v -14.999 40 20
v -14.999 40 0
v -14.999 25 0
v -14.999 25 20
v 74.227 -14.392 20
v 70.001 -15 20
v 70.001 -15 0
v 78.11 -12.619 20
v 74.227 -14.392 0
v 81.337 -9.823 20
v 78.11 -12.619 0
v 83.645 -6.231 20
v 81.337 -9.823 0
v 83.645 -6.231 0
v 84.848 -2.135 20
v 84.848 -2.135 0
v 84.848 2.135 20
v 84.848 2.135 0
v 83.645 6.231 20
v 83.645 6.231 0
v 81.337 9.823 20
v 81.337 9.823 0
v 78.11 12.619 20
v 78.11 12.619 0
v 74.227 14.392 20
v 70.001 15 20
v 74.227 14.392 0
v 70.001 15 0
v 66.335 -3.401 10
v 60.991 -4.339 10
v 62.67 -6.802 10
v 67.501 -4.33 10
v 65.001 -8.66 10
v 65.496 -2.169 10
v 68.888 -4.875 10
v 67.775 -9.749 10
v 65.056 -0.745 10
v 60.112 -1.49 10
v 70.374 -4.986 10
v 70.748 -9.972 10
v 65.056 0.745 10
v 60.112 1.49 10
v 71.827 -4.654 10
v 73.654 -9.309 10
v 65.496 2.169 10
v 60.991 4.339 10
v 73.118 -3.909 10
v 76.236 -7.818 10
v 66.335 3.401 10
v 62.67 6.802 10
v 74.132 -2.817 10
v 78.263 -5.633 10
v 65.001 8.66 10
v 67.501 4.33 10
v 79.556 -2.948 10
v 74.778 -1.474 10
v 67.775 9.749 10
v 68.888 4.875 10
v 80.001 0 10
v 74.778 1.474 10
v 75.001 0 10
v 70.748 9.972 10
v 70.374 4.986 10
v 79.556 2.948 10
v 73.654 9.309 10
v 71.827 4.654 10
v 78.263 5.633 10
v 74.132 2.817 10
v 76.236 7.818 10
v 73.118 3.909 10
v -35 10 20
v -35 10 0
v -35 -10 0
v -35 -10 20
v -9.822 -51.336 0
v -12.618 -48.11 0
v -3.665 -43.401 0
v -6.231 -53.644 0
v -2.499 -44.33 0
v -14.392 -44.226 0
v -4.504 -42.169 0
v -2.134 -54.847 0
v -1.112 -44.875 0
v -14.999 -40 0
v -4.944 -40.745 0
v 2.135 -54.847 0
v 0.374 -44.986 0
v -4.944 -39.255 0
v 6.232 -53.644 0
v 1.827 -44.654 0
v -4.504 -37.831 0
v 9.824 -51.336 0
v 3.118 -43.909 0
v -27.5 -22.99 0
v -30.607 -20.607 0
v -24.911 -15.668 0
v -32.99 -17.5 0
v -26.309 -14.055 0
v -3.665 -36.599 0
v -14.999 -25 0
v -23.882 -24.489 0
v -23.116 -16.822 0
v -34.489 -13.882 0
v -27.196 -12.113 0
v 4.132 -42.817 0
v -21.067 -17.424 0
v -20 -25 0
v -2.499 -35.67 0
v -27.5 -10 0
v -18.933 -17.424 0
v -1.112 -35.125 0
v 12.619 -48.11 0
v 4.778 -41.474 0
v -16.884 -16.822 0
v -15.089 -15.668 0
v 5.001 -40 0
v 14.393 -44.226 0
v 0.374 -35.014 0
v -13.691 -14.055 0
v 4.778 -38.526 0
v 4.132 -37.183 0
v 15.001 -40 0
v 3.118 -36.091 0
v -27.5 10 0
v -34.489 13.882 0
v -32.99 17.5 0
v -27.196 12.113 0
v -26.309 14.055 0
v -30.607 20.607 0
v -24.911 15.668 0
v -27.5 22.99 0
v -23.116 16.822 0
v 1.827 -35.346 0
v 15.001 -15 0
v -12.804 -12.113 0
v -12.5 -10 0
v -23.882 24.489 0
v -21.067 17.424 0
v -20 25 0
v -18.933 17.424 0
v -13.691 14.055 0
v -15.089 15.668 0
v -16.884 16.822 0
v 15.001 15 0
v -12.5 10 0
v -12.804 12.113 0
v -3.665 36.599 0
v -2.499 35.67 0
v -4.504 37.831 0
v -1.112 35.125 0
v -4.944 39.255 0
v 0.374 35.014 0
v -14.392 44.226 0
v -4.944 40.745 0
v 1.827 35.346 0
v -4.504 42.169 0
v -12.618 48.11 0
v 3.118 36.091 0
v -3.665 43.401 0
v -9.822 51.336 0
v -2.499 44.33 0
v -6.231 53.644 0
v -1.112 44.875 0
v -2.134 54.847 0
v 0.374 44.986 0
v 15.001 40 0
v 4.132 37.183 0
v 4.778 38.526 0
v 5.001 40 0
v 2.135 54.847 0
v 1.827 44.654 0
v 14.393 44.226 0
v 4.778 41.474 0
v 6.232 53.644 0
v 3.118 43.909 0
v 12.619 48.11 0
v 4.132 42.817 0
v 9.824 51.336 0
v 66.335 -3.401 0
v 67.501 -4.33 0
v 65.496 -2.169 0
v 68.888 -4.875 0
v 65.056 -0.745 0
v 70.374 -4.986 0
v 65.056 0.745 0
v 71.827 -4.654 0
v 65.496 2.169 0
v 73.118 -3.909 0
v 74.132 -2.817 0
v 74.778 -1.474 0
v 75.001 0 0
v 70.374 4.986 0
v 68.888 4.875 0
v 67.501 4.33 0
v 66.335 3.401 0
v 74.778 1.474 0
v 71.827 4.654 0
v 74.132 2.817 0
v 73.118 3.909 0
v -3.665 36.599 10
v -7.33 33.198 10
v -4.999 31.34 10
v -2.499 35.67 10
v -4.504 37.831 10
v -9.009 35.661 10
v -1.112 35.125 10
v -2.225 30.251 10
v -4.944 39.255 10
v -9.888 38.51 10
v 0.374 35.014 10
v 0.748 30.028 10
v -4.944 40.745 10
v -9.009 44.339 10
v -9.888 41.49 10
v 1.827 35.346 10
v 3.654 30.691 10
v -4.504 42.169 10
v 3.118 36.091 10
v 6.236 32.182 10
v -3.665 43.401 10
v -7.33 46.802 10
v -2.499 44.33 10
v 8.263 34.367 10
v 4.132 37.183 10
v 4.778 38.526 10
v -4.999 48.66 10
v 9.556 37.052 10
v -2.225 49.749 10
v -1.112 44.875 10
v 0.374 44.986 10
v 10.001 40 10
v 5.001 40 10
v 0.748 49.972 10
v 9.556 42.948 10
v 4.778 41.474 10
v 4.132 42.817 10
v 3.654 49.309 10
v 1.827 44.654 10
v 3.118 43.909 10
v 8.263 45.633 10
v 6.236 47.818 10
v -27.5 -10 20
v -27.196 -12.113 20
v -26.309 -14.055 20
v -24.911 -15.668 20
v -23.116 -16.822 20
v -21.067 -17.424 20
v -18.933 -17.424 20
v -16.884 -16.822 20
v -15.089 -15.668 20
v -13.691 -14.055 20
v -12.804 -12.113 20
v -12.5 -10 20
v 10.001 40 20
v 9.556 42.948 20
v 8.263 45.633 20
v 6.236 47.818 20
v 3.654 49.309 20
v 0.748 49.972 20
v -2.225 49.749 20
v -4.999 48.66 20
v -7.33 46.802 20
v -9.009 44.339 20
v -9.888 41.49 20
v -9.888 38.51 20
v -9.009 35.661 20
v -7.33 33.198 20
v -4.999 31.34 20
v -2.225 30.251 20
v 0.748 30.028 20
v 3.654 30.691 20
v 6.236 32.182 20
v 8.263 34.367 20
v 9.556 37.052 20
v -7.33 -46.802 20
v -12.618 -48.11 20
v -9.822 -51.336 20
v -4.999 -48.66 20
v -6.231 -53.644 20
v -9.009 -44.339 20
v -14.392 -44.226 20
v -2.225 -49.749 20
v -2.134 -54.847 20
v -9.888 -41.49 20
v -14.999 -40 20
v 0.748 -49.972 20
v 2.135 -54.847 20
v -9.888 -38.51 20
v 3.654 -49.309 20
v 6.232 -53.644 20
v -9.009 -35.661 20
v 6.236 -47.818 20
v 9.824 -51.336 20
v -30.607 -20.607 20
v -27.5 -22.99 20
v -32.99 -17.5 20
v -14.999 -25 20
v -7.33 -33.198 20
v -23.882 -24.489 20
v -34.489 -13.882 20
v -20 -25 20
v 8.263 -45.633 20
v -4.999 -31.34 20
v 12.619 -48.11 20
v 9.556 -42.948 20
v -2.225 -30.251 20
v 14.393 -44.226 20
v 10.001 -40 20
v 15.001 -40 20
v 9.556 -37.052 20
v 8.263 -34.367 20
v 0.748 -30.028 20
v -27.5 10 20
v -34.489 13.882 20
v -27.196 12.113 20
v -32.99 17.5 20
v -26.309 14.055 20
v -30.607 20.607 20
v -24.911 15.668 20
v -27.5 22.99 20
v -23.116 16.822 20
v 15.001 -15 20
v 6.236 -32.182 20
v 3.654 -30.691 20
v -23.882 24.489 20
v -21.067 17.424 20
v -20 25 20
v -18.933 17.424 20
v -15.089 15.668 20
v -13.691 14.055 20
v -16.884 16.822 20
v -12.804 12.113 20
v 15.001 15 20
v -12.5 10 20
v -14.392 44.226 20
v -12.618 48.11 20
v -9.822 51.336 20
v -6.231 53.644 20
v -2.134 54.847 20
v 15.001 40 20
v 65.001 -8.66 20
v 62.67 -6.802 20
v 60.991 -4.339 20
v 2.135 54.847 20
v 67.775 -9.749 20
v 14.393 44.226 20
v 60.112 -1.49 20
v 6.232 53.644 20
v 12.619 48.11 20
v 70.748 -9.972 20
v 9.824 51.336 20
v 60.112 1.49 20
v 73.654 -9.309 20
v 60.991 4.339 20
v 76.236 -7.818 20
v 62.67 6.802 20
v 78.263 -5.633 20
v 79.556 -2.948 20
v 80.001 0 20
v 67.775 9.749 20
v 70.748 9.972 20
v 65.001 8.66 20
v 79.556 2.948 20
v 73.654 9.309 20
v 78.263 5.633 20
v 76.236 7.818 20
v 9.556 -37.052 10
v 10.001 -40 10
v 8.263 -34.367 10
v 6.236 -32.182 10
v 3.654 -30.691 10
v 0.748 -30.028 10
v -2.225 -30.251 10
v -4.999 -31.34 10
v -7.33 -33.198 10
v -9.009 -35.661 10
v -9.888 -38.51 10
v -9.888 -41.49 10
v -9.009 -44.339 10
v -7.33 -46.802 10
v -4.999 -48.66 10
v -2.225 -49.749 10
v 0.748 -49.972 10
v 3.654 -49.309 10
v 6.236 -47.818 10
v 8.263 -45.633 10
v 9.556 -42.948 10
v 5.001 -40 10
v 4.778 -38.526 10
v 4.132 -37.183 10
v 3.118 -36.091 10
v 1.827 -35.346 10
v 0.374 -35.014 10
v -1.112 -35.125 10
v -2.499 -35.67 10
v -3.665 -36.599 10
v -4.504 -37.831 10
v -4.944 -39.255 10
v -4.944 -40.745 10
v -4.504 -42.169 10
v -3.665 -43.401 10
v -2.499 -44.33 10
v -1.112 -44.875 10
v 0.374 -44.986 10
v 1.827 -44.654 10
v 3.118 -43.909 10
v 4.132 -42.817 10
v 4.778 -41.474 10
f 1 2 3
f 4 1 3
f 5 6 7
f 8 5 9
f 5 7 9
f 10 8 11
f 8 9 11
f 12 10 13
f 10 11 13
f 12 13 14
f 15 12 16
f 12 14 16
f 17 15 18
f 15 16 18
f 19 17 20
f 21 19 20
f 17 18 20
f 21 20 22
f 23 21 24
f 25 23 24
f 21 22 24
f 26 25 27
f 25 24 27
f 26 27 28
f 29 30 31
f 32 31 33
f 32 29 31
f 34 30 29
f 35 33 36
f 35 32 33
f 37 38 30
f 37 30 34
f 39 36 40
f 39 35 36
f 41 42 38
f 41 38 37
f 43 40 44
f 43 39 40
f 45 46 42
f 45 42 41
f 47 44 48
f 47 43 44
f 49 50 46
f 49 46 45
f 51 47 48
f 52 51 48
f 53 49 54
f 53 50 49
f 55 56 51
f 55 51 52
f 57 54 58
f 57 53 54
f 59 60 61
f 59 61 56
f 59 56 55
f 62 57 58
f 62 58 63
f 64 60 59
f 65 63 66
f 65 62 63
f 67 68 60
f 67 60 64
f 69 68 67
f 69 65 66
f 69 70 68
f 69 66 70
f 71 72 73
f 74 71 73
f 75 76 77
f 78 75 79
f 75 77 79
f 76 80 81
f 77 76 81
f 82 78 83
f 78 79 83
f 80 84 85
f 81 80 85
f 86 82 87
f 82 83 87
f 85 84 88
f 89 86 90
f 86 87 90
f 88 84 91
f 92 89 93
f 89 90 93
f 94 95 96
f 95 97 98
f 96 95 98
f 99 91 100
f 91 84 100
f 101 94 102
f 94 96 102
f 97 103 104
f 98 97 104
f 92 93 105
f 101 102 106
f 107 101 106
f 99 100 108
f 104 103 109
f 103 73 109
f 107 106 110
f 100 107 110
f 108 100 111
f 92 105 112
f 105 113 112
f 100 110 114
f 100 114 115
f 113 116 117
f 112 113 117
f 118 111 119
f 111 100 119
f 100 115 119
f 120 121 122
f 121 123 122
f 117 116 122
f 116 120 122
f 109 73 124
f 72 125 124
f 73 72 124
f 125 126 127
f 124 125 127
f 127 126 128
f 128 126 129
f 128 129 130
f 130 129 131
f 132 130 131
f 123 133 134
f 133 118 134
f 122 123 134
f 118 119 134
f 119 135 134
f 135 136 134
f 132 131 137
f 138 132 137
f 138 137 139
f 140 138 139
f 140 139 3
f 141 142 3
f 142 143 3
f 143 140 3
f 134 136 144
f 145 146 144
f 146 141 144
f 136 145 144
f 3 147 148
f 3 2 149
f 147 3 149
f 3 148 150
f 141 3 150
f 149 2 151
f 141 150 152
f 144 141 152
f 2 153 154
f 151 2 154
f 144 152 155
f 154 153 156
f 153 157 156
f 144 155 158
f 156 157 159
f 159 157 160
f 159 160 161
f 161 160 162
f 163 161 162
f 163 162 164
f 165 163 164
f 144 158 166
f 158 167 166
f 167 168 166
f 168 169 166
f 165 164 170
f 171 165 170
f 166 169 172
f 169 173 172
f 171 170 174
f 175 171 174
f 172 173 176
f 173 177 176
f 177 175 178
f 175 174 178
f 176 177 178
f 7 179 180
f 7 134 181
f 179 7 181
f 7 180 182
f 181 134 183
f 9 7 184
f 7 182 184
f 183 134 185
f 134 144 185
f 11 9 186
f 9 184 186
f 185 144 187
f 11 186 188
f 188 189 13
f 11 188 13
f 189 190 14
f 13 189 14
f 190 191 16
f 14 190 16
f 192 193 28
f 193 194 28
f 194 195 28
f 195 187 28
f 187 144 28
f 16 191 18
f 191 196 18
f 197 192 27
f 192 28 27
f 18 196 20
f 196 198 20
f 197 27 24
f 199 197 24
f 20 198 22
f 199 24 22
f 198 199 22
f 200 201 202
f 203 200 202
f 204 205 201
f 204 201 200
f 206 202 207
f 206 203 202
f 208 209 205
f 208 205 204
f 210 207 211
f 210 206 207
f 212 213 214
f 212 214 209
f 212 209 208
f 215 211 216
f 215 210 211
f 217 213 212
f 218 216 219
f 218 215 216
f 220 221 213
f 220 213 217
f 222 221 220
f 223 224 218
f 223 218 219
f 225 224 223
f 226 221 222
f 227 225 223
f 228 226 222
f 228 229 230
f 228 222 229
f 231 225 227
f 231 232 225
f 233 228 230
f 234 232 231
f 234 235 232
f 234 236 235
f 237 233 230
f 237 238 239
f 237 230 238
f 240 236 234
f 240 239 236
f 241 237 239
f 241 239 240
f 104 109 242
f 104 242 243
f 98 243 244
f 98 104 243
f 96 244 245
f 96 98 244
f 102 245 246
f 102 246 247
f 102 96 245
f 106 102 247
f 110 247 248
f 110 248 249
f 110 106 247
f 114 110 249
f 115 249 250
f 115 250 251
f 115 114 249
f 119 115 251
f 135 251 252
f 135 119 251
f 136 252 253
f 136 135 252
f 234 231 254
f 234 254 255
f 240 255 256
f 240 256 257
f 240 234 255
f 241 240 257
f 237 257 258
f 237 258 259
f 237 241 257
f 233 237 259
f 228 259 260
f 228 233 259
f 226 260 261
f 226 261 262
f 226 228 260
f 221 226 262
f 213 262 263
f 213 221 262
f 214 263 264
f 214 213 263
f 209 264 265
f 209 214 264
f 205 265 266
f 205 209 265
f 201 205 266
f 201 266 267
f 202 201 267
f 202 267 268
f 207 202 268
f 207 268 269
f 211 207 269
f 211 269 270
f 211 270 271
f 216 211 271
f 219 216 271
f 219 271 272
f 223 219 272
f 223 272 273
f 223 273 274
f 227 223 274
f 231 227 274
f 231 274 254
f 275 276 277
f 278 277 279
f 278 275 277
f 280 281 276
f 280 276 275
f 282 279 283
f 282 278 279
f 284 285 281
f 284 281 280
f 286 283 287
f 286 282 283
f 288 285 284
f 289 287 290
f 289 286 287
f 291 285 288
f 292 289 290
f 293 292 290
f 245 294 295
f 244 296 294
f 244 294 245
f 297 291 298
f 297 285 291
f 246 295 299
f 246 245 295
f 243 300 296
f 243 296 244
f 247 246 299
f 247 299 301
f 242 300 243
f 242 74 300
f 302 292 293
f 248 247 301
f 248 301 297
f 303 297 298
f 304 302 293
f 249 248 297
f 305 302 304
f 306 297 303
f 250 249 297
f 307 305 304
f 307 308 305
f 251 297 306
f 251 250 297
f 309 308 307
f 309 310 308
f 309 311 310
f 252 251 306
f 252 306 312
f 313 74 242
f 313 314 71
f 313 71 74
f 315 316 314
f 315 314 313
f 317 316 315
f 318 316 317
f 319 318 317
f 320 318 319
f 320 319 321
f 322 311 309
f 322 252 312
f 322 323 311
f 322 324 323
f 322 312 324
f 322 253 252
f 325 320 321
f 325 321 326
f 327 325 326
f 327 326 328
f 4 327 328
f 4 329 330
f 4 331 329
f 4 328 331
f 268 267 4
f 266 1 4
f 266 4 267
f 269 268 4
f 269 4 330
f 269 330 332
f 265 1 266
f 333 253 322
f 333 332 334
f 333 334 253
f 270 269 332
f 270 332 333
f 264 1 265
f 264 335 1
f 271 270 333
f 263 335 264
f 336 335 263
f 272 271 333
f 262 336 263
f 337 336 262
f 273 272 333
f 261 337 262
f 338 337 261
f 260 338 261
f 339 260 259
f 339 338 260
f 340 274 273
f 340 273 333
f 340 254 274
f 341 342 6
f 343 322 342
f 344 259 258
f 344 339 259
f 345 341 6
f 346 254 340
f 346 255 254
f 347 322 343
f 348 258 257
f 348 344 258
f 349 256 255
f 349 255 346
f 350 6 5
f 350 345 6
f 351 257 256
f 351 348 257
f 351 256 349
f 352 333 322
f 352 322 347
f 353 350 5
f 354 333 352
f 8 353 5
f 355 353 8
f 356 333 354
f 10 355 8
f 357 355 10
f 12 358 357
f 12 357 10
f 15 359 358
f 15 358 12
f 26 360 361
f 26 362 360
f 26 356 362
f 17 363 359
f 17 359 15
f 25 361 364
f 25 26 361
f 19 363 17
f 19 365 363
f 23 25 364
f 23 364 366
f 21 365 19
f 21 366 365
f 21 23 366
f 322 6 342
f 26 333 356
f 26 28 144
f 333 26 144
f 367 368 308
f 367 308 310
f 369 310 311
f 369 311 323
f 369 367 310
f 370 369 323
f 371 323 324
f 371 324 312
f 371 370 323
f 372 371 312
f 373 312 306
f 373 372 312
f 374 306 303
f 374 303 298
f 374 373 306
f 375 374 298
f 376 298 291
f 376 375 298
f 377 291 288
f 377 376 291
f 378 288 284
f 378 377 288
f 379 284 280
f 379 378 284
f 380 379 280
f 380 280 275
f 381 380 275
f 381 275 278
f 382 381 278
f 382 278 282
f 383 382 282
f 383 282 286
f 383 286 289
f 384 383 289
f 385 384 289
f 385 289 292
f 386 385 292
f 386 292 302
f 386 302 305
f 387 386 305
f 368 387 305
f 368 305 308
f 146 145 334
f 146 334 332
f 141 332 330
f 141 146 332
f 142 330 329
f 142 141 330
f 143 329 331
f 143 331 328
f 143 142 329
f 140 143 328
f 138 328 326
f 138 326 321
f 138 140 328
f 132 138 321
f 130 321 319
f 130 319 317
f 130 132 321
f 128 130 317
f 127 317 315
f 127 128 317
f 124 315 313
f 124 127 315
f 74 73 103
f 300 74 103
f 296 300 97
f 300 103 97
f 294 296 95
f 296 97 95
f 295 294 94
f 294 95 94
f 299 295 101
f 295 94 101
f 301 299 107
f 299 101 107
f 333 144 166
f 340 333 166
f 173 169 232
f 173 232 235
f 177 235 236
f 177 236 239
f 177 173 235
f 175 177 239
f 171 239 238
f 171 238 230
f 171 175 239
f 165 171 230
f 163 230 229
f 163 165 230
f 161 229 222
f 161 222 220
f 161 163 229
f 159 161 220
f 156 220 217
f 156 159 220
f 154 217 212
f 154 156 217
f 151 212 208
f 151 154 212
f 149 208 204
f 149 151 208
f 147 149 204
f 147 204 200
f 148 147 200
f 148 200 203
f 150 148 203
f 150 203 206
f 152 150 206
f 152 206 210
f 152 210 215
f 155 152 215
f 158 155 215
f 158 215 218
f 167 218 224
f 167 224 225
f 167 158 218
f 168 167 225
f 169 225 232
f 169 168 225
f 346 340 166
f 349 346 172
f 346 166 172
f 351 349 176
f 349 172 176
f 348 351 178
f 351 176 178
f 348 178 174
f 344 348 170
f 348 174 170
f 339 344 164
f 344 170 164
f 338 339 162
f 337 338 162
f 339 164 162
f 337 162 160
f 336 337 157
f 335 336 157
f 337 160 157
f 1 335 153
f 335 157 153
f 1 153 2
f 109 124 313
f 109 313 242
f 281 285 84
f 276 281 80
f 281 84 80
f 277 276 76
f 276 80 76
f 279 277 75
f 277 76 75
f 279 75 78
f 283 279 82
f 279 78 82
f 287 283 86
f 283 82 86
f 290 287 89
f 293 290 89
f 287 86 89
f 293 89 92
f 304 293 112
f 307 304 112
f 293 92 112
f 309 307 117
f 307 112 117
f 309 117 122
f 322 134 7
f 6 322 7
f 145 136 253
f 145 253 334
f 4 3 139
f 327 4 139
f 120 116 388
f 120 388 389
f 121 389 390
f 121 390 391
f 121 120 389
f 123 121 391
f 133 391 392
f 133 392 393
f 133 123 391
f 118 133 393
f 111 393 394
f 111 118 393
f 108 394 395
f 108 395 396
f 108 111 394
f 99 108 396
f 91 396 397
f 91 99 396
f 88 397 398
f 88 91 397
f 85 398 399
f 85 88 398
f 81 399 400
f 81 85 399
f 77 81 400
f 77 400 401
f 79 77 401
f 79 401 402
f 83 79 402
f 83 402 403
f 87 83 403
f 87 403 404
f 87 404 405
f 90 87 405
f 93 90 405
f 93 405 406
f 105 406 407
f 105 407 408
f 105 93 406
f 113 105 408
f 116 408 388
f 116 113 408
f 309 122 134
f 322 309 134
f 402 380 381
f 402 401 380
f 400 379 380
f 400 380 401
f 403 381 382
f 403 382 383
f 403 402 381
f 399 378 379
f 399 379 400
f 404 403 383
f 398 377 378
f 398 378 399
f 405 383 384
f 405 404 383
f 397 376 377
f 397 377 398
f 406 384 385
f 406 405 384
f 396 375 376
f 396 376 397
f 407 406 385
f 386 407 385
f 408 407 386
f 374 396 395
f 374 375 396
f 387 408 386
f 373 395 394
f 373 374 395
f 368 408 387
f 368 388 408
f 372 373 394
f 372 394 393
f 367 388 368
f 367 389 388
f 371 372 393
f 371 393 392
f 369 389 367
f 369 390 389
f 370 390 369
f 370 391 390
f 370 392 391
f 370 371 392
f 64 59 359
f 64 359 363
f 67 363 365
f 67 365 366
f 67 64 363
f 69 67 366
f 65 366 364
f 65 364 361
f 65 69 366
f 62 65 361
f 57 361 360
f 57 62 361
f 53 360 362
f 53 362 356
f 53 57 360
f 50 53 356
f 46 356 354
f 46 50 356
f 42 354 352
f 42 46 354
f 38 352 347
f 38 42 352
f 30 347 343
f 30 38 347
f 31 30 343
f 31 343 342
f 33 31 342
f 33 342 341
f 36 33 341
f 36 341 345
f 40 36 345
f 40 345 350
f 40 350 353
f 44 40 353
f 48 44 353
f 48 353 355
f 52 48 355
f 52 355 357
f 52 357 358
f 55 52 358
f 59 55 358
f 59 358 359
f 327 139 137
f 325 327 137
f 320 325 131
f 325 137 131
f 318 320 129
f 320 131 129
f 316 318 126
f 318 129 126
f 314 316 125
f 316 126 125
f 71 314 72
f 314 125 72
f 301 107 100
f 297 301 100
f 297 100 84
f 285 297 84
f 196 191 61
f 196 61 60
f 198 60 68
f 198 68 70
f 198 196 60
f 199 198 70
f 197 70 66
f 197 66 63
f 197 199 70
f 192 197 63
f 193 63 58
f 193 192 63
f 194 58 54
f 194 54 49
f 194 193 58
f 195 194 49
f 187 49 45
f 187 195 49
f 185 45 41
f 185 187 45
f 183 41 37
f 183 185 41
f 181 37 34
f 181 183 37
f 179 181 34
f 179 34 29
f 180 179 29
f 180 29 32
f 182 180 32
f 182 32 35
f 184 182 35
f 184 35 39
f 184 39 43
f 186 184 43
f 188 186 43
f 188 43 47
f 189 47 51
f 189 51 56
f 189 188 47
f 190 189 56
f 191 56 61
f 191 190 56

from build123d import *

# Parameters (mm, degrees)
IZIM1_R                     = 10
Y_KSEKLIK_EKSTR_ZYON1_DEPTH = 20
IZIM1_3_R                   = 10
IZIM1_3_R_2                 = 5
Y_KSEKLIK_EKSTR_ZYON2_DEPTH = 10


with BuildPart() as part:
    # Çizim1 → Yükseklik-Ekstrüzyon1 (new body)
    with BuildSketch(Plane.XY):
        with BuildLine():
            Line((15.000607379, -40), (15.000607379, -15))
            Line((15.000607379, -15), (70.000607379, -15))
            ThreePointArc((70.000607379, -15), (85.000607379, 0), (70.000607379, 15))
            Line((70.000607379, 15), (15.000607379, 15))
            Line((15.000607379, 15), (15.000607379, 40))
            ThreePointArc((15.000607379, 40), (0.000607379, 55), (-14.999392621, 40))
            Line((-14.999392621, 40), (-14.999392621, 28.684816199))
            Line((-14.999392621, 28.684816199), (-14.999392621, 25))
            Line((-14.999392621, 25), (-20, 25))
            ThreePointArc((-20, 25), (-30.606601718, 20.606601718), (-35, 10))
            Line((-35, 10), (-35, -10))
            ThreePointArc((-35, -10), (-30.606601718, -20.606601718), (-20, -25))
            Line((-20, -25), (-14.999392621, -25))
            Line((-14.999392621, -25), (-14.999392621, -40))
            ThreePointArc((-14.999392621, -40), (0.000607379, -55), (15.000607379, -40))
        make_face()
        with Locations((0.000607379, -40)):
            Circle(IZIM1_R, mode=Mode.SUBTRACT)
        with BuildLine():
            ThreePointArc((-27.5, 10), (-20, 17.5), (-12.5, 10))
            Line((-12.5, 10), (-12.5, -10))
            ThreePointArc((-12.5, -10), (-20, -17.5), (-27.5, -10))
            Line((-27.5, -10), (-27.5, 10))
        make_face(mode=Mode.SUBTRACT)
        with Locations((0.000607379, 40)):
            Circle(IZIM1_R, mode=Mode.SUBTRACT)
        with Locations((70.000607379, 0)):
            Circle(IZIM1_R, mode=Mode.SUBTRACT)
    extrude(amount=Y_KSEKLIK_EKSTR_ZYON1_DEPTH)

    # Çizim1<3> → Yükseklik-Ekstrüzyon2 (add)
    # profile 1 of 3: a face of its own
    with BuildSketch(Plane.XY):
        with Locations((0.000607379, -40)):
            Circle(IZIM1_3_R)
        with Locations((0.000607379, -40)):
            Circle(IZIM1_3_R_2, mode=Mode.SUBTRACT)
    # profile 2 of 3: a face of its own
    with BuildSketch(Plane.XY):
        with Locations((0.000607379, 40)):
            Circle(IZIM1_3_R)
        with Locations((0.000607379, 40)):
            Circle(IZIM1_3_R_2, mode=Mode.SUBTRACT)
    # profile 3 of 3: a face of its own
    with BuildSketch(Plane.XY):
        with Locations((70.000607379, 0)):
            Circle(IZIM1_3_R)
        with Locations((70.000607379, 0)):
            Circle(IZIM1_3_R_2, mode=Mode.SUBTRACT)
    extrude(amount=Y_KSEKLIK_EKSTR_ZYON2_DEPTH)


solid = part.part
